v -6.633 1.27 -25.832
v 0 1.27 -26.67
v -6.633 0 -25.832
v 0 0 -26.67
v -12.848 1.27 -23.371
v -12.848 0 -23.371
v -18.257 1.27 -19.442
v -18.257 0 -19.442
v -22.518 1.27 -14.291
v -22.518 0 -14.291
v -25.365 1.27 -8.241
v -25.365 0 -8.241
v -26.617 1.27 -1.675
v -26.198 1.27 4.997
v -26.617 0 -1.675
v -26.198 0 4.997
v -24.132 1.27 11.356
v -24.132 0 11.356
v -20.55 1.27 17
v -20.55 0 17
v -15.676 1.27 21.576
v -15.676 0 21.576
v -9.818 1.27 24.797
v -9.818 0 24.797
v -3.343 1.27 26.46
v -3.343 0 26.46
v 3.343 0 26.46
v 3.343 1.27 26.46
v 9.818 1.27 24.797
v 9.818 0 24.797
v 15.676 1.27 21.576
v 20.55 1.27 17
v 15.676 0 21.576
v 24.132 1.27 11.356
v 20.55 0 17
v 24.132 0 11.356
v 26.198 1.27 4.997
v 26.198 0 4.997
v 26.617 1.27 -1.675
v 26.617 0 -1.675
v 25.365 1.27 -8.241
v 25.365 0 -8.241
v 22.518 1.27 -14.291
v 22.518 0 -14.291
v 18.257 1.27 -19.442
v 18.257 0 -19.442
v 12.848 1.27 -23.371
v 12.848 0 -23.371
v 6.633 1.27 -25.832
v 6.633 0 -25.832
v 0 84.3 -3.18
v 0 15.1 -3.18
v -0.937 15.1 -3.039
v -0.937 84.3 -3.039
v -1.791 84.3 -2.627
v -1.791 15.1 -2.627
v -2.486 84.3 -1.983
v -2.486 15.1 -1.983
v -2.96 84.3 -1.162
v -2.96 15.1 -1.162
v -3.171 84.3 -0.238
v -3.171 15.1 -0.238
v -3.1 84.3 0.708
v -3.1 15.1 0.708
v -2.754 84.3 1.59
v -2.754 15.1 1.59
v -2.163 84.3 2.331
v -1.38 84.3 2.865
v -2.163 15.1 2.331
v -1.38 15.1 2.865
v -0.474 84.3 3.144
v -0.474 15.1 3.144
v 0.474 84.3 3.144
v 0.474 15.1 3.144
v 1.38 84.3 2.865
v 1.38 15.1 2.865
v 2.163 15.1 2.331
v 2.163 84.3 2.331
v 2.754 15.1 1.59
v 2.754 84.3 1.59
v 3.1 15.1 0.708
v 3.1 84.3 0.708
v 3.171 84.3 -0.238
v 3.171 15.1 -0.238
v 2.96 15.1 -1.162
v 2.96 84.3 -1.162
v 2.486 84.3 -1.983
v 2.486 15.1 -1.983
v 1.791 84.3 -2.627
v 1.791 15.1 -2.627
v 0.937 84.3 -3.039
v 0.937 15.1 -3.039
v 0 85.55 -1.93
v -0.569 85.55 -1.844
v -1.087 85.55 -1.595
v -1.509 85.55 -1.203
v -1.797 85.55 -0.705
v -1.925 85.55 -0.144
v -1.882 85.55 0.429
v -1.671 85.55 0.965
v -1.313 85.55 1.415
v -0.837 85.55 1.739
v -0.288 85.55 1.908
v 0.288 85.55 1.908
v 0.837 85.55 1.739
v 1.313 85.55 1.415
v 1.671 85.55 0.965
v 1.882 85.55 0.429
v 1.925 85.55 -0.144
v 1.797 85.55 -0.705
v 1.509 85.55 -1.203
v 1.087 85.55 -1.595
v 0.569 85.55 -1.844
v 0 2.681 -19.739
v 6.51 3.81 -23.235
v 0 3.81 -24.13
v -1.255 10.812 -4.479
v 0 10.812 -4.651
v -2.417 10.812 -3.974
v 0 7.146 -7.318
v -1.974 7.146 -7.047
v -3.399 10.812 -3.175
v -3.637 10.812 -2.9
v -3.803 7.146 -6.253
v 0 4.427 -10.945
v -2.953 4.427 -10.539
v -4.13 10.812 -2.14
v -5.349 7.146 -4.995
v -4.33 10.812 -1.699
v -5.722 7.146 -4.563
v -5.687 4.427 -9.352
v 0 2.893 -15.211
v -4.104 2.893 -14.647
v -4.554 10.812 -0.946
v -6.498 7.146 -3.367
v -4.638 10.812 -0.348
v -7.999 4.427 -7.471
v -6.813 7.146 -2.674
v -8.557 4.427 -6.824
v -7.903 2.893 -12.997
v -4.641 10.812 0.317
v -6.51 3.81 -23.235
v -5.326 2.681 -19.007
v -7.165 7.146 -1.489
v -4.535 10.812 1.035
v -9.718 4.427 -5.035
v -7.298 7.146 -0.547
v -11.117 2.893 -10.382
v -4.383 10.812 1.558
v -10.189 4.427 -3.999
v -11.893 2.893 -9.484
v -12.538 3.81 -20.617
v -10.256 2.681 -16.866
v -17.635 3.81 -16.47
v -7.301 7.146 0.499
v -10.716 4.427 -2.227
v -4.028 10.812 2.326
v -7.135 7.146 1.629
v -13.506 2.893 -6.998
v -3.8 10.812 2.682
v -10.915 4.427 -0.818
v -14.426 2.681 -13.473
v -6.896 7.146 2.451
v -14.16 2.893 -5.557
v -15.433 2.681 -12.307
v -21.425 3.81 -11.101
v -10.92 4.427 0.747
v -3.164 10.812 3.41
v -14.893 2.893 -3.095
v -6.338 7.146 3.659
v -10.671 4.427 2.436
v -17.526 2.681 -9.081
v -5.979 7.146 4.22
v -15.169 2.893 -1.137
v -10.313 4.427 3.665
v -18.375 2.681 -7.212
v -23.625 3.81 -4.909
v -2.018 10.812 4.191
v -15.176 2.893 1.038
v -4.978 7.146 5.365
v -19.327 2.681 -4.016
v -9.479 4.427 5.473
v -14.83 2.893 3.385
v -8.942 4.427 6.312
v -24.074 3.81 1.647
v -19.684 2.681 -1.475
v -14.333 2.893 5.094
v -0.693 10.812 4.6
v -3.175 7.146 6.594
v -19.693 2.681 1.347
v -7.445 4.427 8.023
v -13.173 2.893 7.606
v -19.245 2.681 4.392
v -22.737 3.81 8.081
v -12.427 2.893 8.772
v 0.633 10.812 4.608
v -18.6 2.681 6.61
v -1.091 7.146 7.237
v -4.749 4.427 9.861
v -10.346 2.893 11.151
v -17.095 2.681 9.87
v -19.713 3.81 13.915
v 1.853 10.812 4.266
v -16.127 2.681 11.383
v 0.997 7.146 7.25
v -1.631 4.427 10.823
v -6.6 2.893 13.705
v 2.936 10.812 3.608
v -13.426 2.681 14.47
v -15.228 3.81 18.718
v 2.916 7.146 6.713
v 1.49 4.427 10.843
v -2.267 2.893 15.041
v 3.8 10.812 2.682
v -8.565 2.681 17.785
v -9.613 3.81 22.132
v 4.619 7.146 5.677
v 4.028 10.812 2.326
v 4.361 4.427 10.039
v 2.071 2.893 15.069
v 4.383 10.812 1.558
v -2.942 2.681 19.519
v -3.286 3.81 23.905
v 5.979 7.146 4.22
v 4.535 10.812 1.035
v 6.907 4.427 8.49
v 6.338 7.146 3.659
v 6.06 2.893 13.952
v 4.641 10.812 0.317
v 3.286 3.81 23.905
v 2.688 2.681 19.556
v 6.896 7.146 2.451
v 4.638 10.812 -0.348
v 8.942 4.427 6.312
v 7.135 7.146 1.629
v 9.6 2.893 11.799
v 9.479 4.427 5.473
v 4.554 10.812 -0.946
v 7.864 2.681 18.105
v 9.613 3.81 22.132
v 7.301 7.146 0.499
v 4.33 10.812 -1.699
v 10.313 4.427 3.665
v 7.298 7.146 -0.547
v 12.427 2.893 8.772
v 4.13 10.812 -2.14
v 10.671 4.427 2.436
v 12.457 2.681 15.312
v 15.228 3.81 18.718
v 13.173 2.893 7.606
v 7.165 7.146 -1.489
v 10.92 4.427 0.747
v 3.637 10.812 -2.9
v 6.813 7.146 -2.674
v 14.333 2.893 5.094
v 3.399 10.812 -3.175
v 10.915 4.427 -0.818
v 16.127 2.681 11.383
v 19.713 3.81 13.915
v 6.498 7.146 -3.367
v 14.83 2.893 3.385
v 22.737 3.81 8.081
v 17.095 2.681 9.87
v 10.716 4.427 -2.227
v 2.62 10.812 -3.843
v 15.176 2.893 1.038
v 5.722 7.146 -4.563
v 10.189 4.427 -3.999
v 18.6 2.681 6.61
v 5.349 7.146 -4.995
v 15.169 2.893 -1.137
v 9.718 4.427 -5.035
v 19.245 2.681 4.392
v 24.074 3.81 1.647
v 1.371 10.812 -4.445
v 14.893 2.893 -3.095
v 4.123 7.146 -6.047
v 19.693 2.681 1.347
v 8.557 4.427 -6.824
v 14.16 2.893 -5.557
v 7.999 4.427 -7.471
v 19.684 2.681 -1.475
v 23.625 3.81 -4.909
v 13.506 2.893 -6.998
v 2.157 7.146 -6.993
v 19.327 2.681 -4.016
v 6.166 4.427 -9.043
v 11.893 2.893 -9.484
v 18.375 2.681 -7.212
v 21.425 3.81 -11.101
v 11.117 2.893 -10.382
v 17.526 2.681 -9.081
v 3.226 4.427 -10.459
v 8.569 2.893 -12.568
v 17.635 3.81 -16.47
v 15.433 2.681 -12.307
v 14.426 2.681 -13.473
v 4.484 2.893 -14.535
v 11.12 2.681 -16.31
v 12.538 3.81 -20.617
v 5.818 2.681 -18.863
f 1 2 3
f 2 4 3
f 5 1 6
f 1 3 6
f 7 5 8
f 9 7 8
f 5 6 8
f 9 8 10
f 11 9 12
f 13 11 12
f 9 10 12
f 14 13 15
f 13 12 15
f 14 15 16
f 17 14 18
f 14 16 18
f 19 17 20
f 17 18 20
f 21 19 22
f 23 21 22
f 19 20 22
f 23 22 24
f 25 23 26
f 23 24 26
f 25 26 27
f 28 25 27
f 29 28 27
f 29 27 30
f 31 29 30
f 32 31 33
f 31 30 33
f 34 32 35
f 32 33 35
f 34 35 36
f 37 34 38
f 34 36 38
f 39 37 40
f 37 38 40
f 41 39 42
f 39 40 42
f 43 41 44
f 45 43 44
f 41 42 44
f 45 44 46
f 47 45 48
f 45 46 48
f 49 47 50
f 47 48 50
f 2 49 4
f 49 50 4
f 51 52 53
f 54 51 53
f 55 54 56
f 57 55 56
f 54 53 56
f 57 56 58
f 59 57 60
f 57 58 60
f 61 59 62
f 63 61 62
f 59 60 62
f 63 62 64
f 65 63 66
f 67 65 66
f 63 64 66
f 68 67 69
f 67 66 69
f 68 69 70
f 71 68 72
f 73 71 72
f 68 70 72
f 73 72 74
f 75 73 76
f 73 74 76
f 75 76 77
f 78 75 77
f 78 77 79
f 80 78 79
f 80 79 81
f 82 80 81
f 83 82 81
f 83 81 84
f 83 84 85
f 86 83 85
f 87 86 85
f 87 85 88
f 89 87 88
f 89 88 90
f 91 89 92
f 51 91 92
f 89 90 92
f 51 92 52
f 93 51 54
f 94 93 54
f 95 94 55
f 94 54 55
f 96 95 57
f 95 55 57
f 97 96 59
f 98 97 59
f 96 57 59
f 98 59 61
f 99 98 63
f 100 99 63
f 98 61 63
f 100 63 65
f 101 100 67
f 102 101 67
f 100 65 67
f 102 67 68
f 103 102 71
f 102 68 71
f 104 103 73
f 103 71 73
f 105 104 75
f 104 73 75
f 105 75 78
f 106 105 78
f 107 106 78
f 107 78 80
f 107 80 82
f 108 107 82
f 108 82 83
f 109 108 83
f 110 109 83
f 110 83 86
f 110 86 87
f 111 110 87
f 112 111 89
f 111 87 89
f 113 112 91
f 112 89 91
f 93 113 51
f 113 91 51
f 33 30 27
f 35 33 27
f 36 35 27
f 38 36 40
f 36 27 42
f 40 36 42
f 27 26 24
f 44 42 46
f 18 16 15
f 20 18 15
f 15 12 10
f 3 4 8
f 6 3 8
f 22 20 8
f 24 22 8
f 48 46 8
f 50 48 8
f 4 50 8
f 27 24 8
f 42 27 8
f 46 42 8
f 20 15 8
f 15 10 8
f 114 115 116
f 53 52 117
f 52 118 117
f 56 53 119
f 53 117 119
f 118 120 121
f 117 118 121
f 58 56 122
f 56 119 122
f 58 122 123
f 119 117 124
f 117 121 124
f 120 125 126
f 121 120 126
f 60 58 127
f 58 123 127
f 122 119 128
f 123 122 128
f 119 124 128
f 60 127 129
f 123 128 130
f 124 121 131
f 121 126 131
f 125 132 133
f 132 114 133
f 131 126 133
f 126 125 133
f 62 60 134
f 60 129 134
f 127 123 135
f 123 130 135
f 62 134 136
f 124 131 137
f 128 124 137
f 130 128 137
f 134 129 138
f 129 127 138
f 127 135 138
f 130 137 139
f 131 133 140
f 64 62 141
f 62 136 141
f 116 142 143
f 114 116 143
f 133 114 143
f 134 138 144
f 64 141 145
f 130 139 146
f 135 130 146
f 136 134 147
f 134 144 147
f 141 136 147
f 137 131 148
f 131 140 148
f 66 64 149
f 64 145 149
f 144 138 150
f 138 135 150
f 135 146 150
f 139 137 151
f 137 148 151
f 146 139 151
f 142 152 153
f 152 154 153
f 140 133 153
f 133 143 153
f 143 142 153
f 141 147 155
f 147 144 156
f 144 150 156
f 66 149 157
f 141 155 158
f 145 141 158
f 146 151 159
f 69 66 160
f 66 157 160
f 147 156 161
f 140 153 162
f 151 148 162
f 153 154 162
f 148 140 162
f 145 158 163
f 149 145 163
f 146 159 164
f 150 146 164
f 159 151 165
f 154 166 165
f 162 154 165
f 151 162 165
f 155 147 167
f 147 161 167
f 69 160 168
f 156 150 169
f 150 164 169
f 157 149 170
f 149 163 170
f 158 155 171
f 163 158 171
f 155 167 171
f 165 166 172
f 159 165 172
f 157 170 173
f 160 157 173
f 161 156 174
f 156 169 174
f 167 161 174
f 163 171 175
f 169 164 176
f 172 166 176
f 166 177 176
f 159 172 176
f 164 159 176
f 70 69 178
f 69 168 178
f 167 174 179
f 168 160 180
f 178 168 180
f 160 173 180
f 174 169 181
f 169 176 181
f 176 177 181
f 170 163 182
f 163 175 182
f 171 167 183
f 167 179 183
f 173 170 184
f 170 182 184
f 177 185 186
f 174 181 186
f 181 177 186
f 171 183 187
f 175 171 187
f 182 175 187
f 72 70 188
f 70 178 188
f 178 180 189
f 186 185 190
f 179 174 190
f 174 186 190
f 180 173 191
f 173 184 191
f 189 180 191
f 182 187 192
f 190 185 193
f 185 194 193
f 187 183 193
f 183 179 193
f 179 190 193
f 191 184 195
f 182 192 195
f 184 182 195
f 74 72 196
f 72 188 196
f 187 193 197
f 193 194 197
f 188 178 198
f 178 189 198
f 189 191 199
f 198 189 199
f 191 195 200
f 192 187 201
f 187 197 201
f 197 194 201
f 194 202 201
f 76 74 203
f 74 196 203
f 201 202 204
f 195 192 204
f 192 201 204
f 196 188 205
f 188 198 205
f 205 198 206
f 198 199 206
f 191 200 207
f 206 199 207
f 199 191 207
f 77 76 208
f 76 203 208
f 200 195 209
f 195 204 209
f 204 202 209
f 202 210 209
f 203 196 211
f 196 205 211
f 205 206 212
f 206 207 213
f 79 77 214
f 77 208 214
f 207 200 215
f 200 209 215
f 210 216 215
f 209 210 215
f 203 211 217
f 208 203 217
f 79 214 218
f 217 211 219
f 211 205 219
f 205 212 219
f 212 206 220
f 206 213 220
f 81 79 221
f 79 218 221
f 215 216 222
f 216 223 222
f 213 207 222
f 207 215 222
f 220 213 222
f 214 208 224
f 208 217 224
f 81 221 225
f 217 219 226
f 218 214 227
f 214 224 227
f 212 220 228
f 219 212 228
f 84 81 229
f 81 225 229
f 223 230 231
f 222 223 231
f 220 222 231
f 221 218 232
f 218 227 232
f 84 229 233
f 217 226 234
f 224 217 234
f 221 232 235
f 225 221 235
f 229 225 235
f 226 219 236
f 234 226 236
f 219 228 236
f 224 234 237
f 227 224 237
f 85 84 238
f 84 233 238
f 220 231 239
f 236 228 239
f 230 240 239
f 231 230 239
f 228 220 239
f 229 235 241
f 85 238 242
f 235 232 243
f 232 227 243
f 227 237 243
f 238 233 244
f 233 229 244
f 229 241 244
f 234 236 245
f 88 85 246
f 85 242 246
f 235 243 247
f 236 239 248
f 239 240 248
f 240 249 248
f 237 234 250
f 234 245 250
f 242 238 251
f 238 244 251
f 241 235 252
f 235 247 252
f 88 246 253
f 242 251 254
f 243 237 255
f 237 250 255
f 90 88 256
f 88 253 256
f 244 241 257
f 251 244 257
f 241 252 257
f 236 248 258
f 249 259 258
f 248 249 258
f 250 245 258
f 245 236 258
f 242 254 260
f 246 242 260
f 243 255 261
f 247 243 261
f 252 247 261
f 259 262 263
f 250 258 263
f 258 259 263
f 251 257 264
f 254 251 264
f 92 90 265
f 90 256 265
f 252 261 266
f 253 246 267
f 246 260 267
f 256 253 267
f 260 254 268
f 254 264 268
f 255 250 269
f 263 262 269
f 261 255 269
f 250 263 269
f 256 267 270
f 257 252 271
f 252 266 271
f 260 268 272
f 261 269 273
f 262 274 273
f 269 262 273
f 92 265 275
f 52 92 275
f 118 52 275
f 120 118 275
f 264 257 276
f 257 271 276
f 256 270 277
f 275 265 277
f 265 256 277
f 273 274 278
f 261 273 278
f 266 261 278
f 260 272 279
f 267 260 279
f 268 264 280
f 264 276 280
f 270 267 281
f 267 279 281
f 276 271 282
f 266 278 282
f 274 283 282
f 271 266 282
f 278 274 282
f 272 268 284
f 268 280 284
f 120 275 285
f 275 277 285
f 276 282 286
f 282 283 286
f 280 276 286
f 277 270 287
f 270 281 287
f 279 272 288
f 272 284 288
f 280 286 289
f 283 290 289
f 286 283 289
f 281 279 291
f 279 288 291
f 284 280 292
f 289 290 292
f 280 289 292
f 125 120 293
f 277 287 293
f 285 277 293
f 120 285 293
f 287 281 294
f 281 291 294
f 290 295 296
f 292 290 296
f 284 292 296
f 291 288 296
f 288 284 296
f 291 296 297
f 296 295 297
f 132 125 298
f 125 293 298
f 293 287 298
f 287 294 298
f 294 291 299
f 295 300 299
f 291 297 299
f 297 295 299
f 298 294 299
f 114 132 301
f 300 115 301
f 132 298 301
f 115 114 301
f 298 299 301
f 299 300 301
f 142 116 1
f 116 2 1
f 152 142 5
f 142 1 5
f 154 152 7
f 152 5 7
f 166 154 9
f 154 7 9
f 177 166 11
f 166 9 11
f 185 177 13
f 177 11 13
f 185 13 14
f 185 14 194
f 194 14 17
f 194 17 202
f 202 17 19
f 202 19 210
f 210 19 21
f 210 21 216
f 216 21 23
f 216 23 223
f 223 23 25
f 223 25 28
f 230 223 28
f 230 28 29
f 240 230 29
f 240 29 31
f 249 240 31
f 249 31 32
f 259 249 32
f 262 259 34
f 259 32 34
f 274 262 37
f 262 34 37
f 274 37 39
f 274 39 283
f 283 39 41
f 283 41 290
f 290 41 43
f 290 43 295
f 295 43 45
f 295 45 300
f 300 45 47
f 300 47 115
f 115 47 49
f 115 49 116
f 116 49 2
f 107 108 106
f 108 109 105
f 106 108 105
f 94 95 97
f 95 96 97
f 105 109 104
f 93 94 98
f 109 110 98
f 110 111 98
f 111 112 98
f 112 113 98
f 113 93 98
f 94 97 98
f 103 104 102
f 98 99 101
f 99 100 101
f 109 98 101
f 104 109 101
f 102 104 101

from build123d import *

# Parameters (mm, degrees)
CHAMFER1_SIZE = 1.25


with BuildPart() as part:
    # Sketch1 → Revolve1 (revolve)
    with BuildSketch(Plane(origin=(0, 0, 0), x_dir=(0, 0, -1), z_dir=(1, 0, 0))):
        with BuildLine():
            Line((0, 0), (0, 85.55))
            Line((0, 85.55), (3.18, 85.55))
            Line((3.18, 85.55), (3.18, 15.100044805))
            ThreePointArc((3.18, 15.100044805), (10.945145292, 4.426569715), (24.13, 3.81))
            Line((24.13, 3.81), (26.67, 1.27))
            Line((26.67, 1.27), (26.67, 0))
            Line((26.67, 0), (0, 0))
        make_face()
    revolve(axis=Axis((0, 0, 0), (0, 1, 0)))

    # Chamfer1
    chamfer1_edges = [part.edges().sort_by_distance(p)[0] for p in [
        (0, 85.55, 3.18),
    ]]
    chamfer(chamfer1_edges, length=CHAMFER1_SIZE)


solid = part.part
